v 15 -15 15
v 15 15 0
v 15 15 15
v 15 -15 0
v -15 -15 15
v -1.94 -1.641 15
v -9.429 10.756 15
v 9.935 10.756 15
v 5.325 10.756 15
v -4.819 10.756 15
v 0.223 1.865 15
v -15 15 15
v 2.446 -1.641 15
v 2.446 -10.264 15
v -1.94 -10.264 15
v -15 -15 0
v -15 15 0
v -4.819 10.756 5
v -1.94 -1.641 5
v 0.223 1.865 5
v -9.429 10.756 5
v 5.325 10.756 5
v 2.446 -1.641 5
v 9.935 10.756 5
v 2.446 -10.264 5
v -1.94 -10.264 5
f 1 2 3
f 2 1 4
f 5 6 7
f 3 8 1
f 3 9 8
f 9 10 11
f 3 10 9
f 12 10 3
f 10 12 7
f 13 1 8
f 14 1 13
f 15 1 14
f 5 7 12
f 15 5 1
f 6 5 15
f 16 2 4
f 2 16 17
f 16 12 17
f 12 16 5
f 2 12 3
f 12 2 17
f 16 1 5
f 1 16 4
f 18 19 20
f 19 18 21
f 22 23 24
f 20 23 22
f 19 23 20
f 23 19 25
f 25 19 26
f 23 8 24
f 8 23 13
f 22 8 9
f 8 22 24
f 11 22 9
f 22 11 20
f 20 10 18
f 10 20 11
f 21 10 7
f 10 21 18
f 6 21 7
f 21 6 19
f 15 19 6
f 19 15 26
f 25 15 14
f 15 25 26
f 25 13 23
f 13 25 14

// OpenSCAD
// Volume: 12100.541119239719, SurfaceArea: 4402.935151204062
// LetterBlock.scad - Basic usage of text() and linear_extrude()

// Module instantiation
LetterBlock("Y");

// Module definition.
// size=30 defines an optional parameter with a default value.
module LetterBlock(letter, size=30) {
    difference() {
        translate([0,0,size/4]) cube([size,size,size/2], center=true);
        translate([0,0,size/6]) {
            // convexity is needed for correct preview
            // since characters can be highly concave
            linear_extrude(height=size, convexity=4)
                text(letter, 
                     size=size*22/30,
                     font="Liberation Sans:style=bold",
                     halign="center",
                     valign="center");
        }
    }
}

echo(version=version());
// Written by Marius Kintel <marius@kintel.net>
//
// To the extent possible under law, the author(s) have dedicated all
// copyright and related and neighboring rights to this software to the
// public domain worldwide. This software is distributed without any
// warranty.
//
// You should have received a copy of the CC0 Public Domain
// Dedication along with this software.
// If not, see <http://creativecommons.org/publicdomain/zero/1.0/>.
